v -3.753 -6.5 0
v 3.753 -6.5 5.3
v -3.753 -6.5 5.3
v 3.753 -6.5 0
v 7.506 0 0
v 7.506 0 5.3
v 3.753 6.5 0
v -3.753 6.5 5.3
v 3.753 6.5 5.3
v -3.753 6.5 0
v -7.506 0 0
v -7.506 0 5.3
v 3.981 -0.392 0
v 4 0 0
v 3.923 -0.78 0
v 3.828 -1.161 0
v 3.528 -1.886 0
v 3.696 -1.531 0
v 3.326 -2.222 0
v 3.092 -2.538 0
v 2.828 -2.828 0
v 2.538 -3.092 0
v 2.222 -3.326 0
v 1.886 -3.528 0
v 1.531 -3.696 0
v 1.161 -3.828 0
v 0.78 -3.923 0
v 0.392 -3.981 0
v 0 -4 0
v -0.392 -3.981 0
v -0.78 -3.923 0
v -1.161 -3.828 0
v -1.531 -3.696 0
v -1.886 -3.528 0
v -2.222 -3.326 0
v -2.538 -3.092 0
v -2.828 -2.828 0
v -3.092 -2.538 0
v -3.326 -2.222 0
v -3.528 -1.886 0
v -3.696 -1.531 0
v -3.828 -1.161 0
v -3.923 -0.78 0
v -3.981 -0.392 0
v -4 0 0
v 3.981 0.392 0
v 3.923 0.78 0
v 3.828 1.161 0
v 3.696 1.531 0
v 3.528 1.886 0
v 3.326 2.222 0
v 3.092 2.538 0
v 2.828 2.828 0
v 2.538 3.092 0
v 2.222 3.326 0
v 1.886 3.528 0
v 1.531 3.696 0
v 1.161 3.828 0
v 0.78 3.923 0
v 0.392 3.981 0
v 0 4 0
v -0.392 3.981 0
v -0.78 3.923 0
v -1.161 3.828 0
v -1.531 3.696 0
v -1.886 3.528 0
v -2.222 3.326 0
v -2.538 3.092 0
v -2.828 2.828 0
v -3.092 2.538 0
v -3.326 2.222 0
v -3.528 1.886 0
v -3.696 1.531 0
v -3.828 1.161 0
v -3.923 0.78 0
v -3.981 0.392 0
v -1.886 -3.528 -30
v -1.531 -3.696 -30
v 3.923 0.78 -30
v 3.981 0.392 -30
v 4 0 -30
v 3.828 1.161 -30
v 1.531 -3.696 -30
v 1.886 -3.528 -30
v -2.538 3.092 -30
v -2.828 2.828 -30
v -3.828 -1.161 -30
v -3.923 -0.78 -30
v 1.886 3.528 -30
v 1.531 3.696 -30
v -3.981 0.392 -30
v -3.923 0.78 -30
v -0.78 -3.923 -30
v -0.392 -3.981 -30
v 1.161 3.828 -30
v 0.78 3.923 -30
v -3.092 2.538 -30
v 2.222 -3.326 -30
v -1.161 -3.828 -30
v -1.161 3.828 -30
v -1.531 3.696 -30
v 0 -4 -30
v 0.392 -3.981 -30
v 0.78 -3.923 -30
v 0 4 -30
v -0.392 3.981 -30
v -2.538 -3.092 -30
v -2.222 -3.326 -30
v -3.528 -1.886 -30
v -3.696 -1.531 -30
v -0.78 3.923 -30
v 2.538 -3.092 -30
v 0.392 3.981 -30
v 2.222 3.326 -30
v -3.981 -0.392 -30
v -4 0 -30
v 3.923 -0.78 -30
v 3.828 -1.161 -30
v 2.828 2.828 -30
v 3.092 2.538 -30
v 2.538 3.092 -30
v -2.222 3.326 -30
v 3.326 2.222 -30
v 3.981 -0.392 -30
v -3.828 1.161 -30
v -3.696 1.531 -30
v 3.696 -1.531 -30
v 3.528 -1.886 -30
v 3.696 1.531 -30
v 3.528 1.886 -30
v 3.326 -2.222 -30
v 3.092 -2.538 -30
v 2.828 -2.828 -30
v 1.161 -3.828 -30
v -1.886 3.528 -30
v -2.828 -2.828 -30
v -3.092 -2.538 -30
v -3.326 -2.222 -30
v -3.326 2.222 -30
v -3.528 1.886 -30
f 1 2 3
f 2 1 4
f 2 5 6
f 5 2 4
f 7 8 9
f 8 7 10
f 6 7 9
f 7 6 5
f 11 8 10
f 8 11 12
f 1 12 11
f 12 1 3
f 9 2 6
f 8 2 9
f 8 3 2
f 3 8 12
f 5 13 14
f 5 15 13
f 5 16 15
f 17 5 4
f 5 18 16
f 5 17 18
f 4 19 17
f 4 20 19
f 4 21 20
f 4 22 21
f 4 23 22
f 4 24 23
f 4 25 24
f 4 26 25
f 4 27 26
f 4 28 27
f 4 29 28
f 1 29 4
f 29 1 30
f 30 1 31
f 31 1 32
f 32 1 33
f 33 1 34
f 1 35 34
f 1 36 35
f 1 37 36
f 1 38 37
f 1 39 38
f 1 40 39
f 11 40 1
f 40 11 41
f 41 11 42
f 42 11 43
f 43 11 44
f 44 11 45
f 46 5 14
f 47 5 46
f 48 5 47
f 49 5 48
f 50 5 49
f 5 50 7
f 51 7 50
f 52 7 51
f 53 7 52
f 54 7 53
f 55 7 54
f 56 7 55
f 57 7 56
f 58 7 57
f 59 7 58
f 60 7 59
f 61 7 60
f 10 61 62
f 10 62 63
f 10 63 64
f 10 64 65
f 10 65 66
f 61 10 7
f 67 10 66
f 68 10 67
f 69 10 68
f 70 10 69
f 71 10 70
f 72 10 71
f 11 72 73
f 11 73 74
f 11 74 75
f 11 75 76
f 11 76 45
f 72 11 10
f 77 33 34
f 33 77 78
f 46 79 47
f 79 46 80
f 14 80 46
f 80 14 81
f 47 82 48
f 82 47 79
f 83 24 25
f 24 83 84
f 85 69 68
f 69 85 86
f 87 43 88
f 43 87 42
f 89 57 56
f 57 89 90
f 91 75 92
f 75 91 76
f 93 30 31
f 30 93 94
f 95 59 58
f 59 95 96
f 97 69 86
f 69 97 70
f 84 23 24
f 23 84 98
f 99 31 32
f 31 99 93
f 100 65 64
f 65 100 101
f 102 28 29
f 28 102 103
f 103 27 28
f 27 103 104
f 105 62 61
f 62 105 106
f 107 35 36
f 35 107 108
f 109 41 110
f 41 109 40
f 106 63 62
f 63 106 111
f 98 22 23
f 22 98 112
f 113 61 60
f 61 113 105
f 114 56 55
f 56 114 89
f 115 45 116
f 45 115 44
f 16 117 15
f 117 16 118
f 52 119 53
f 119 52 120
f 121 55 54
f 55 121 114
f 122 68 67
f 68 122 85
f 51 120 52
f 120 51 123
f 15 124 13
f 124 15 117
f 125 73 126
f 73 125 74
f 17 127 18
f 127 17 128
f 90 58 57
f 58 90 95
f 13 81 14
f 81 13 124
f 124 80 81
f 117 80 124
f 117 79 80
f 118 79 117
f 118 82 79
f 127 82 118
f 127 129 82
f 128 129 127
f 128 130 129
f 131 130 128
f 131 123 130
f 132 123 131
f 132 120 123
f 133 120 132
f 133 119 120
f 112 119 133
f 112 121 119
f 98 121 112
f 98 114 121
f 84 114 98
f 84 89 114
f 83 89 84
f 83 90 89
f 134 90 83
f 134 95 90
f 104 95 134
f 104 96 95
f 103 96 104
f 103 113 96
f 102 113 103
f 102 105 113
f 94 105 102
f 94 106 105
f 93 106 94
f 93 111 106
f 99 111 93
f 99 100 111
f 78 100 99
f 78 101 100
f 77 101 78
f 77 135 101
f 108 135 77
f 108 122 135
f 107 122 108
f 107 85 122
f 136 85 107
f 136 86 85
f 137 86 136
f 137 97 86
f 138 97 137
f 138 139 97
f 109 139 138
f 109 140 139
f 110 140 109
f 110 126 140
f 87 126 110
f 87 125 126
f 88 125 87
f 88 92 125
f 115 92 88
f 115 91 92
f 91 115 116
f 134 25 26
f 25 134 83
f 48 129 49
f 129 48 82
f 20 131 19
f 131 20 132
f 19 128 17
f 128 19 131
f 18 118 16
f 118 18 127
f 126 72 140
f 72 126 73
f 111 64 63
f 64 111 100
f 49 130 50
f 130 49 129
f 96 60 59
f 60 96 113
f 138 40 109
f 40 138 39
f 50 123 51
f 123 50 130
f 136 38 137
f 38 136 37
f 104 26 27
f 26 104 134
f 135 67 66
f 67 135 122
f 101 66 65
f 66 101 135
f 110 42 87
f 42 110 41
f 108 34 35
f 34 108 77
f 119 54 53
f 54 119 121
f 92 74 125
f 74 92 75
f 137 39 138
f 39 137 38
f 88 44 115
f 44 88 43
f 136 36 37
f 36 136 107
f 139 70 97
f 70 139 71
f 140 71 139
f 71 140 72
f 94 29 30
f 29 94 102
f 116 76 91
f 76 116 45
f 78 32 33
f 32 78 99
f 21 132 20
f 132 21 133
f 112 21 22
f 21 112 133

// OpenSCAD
$fn = 64;

// M8 hex bolt (thread omitted)
// Head: hex prism, across flats = 13 mm, height = 5.3 mm
// Shank: cylinder, diameter = 8 mm, length = 30 mm
// Bolt axis: +Z direction
// Head bottom face at z = 0, shank extends toward negative Z

head_af = 13;
head_h = 5.3;
shank_d = 8;
shank_l = 30;

// For a regular hexagon, across flats = 2 * apothem = sqrt(3) * circumradius
hex_r = head_af / sqrt(3);

union() {
    cylinder(h = head_h, r = hex_r, $fn = 6);
    translate([0, 0, -shank_l])
        cylinder(h = shank_l, d = shank_d);
}
